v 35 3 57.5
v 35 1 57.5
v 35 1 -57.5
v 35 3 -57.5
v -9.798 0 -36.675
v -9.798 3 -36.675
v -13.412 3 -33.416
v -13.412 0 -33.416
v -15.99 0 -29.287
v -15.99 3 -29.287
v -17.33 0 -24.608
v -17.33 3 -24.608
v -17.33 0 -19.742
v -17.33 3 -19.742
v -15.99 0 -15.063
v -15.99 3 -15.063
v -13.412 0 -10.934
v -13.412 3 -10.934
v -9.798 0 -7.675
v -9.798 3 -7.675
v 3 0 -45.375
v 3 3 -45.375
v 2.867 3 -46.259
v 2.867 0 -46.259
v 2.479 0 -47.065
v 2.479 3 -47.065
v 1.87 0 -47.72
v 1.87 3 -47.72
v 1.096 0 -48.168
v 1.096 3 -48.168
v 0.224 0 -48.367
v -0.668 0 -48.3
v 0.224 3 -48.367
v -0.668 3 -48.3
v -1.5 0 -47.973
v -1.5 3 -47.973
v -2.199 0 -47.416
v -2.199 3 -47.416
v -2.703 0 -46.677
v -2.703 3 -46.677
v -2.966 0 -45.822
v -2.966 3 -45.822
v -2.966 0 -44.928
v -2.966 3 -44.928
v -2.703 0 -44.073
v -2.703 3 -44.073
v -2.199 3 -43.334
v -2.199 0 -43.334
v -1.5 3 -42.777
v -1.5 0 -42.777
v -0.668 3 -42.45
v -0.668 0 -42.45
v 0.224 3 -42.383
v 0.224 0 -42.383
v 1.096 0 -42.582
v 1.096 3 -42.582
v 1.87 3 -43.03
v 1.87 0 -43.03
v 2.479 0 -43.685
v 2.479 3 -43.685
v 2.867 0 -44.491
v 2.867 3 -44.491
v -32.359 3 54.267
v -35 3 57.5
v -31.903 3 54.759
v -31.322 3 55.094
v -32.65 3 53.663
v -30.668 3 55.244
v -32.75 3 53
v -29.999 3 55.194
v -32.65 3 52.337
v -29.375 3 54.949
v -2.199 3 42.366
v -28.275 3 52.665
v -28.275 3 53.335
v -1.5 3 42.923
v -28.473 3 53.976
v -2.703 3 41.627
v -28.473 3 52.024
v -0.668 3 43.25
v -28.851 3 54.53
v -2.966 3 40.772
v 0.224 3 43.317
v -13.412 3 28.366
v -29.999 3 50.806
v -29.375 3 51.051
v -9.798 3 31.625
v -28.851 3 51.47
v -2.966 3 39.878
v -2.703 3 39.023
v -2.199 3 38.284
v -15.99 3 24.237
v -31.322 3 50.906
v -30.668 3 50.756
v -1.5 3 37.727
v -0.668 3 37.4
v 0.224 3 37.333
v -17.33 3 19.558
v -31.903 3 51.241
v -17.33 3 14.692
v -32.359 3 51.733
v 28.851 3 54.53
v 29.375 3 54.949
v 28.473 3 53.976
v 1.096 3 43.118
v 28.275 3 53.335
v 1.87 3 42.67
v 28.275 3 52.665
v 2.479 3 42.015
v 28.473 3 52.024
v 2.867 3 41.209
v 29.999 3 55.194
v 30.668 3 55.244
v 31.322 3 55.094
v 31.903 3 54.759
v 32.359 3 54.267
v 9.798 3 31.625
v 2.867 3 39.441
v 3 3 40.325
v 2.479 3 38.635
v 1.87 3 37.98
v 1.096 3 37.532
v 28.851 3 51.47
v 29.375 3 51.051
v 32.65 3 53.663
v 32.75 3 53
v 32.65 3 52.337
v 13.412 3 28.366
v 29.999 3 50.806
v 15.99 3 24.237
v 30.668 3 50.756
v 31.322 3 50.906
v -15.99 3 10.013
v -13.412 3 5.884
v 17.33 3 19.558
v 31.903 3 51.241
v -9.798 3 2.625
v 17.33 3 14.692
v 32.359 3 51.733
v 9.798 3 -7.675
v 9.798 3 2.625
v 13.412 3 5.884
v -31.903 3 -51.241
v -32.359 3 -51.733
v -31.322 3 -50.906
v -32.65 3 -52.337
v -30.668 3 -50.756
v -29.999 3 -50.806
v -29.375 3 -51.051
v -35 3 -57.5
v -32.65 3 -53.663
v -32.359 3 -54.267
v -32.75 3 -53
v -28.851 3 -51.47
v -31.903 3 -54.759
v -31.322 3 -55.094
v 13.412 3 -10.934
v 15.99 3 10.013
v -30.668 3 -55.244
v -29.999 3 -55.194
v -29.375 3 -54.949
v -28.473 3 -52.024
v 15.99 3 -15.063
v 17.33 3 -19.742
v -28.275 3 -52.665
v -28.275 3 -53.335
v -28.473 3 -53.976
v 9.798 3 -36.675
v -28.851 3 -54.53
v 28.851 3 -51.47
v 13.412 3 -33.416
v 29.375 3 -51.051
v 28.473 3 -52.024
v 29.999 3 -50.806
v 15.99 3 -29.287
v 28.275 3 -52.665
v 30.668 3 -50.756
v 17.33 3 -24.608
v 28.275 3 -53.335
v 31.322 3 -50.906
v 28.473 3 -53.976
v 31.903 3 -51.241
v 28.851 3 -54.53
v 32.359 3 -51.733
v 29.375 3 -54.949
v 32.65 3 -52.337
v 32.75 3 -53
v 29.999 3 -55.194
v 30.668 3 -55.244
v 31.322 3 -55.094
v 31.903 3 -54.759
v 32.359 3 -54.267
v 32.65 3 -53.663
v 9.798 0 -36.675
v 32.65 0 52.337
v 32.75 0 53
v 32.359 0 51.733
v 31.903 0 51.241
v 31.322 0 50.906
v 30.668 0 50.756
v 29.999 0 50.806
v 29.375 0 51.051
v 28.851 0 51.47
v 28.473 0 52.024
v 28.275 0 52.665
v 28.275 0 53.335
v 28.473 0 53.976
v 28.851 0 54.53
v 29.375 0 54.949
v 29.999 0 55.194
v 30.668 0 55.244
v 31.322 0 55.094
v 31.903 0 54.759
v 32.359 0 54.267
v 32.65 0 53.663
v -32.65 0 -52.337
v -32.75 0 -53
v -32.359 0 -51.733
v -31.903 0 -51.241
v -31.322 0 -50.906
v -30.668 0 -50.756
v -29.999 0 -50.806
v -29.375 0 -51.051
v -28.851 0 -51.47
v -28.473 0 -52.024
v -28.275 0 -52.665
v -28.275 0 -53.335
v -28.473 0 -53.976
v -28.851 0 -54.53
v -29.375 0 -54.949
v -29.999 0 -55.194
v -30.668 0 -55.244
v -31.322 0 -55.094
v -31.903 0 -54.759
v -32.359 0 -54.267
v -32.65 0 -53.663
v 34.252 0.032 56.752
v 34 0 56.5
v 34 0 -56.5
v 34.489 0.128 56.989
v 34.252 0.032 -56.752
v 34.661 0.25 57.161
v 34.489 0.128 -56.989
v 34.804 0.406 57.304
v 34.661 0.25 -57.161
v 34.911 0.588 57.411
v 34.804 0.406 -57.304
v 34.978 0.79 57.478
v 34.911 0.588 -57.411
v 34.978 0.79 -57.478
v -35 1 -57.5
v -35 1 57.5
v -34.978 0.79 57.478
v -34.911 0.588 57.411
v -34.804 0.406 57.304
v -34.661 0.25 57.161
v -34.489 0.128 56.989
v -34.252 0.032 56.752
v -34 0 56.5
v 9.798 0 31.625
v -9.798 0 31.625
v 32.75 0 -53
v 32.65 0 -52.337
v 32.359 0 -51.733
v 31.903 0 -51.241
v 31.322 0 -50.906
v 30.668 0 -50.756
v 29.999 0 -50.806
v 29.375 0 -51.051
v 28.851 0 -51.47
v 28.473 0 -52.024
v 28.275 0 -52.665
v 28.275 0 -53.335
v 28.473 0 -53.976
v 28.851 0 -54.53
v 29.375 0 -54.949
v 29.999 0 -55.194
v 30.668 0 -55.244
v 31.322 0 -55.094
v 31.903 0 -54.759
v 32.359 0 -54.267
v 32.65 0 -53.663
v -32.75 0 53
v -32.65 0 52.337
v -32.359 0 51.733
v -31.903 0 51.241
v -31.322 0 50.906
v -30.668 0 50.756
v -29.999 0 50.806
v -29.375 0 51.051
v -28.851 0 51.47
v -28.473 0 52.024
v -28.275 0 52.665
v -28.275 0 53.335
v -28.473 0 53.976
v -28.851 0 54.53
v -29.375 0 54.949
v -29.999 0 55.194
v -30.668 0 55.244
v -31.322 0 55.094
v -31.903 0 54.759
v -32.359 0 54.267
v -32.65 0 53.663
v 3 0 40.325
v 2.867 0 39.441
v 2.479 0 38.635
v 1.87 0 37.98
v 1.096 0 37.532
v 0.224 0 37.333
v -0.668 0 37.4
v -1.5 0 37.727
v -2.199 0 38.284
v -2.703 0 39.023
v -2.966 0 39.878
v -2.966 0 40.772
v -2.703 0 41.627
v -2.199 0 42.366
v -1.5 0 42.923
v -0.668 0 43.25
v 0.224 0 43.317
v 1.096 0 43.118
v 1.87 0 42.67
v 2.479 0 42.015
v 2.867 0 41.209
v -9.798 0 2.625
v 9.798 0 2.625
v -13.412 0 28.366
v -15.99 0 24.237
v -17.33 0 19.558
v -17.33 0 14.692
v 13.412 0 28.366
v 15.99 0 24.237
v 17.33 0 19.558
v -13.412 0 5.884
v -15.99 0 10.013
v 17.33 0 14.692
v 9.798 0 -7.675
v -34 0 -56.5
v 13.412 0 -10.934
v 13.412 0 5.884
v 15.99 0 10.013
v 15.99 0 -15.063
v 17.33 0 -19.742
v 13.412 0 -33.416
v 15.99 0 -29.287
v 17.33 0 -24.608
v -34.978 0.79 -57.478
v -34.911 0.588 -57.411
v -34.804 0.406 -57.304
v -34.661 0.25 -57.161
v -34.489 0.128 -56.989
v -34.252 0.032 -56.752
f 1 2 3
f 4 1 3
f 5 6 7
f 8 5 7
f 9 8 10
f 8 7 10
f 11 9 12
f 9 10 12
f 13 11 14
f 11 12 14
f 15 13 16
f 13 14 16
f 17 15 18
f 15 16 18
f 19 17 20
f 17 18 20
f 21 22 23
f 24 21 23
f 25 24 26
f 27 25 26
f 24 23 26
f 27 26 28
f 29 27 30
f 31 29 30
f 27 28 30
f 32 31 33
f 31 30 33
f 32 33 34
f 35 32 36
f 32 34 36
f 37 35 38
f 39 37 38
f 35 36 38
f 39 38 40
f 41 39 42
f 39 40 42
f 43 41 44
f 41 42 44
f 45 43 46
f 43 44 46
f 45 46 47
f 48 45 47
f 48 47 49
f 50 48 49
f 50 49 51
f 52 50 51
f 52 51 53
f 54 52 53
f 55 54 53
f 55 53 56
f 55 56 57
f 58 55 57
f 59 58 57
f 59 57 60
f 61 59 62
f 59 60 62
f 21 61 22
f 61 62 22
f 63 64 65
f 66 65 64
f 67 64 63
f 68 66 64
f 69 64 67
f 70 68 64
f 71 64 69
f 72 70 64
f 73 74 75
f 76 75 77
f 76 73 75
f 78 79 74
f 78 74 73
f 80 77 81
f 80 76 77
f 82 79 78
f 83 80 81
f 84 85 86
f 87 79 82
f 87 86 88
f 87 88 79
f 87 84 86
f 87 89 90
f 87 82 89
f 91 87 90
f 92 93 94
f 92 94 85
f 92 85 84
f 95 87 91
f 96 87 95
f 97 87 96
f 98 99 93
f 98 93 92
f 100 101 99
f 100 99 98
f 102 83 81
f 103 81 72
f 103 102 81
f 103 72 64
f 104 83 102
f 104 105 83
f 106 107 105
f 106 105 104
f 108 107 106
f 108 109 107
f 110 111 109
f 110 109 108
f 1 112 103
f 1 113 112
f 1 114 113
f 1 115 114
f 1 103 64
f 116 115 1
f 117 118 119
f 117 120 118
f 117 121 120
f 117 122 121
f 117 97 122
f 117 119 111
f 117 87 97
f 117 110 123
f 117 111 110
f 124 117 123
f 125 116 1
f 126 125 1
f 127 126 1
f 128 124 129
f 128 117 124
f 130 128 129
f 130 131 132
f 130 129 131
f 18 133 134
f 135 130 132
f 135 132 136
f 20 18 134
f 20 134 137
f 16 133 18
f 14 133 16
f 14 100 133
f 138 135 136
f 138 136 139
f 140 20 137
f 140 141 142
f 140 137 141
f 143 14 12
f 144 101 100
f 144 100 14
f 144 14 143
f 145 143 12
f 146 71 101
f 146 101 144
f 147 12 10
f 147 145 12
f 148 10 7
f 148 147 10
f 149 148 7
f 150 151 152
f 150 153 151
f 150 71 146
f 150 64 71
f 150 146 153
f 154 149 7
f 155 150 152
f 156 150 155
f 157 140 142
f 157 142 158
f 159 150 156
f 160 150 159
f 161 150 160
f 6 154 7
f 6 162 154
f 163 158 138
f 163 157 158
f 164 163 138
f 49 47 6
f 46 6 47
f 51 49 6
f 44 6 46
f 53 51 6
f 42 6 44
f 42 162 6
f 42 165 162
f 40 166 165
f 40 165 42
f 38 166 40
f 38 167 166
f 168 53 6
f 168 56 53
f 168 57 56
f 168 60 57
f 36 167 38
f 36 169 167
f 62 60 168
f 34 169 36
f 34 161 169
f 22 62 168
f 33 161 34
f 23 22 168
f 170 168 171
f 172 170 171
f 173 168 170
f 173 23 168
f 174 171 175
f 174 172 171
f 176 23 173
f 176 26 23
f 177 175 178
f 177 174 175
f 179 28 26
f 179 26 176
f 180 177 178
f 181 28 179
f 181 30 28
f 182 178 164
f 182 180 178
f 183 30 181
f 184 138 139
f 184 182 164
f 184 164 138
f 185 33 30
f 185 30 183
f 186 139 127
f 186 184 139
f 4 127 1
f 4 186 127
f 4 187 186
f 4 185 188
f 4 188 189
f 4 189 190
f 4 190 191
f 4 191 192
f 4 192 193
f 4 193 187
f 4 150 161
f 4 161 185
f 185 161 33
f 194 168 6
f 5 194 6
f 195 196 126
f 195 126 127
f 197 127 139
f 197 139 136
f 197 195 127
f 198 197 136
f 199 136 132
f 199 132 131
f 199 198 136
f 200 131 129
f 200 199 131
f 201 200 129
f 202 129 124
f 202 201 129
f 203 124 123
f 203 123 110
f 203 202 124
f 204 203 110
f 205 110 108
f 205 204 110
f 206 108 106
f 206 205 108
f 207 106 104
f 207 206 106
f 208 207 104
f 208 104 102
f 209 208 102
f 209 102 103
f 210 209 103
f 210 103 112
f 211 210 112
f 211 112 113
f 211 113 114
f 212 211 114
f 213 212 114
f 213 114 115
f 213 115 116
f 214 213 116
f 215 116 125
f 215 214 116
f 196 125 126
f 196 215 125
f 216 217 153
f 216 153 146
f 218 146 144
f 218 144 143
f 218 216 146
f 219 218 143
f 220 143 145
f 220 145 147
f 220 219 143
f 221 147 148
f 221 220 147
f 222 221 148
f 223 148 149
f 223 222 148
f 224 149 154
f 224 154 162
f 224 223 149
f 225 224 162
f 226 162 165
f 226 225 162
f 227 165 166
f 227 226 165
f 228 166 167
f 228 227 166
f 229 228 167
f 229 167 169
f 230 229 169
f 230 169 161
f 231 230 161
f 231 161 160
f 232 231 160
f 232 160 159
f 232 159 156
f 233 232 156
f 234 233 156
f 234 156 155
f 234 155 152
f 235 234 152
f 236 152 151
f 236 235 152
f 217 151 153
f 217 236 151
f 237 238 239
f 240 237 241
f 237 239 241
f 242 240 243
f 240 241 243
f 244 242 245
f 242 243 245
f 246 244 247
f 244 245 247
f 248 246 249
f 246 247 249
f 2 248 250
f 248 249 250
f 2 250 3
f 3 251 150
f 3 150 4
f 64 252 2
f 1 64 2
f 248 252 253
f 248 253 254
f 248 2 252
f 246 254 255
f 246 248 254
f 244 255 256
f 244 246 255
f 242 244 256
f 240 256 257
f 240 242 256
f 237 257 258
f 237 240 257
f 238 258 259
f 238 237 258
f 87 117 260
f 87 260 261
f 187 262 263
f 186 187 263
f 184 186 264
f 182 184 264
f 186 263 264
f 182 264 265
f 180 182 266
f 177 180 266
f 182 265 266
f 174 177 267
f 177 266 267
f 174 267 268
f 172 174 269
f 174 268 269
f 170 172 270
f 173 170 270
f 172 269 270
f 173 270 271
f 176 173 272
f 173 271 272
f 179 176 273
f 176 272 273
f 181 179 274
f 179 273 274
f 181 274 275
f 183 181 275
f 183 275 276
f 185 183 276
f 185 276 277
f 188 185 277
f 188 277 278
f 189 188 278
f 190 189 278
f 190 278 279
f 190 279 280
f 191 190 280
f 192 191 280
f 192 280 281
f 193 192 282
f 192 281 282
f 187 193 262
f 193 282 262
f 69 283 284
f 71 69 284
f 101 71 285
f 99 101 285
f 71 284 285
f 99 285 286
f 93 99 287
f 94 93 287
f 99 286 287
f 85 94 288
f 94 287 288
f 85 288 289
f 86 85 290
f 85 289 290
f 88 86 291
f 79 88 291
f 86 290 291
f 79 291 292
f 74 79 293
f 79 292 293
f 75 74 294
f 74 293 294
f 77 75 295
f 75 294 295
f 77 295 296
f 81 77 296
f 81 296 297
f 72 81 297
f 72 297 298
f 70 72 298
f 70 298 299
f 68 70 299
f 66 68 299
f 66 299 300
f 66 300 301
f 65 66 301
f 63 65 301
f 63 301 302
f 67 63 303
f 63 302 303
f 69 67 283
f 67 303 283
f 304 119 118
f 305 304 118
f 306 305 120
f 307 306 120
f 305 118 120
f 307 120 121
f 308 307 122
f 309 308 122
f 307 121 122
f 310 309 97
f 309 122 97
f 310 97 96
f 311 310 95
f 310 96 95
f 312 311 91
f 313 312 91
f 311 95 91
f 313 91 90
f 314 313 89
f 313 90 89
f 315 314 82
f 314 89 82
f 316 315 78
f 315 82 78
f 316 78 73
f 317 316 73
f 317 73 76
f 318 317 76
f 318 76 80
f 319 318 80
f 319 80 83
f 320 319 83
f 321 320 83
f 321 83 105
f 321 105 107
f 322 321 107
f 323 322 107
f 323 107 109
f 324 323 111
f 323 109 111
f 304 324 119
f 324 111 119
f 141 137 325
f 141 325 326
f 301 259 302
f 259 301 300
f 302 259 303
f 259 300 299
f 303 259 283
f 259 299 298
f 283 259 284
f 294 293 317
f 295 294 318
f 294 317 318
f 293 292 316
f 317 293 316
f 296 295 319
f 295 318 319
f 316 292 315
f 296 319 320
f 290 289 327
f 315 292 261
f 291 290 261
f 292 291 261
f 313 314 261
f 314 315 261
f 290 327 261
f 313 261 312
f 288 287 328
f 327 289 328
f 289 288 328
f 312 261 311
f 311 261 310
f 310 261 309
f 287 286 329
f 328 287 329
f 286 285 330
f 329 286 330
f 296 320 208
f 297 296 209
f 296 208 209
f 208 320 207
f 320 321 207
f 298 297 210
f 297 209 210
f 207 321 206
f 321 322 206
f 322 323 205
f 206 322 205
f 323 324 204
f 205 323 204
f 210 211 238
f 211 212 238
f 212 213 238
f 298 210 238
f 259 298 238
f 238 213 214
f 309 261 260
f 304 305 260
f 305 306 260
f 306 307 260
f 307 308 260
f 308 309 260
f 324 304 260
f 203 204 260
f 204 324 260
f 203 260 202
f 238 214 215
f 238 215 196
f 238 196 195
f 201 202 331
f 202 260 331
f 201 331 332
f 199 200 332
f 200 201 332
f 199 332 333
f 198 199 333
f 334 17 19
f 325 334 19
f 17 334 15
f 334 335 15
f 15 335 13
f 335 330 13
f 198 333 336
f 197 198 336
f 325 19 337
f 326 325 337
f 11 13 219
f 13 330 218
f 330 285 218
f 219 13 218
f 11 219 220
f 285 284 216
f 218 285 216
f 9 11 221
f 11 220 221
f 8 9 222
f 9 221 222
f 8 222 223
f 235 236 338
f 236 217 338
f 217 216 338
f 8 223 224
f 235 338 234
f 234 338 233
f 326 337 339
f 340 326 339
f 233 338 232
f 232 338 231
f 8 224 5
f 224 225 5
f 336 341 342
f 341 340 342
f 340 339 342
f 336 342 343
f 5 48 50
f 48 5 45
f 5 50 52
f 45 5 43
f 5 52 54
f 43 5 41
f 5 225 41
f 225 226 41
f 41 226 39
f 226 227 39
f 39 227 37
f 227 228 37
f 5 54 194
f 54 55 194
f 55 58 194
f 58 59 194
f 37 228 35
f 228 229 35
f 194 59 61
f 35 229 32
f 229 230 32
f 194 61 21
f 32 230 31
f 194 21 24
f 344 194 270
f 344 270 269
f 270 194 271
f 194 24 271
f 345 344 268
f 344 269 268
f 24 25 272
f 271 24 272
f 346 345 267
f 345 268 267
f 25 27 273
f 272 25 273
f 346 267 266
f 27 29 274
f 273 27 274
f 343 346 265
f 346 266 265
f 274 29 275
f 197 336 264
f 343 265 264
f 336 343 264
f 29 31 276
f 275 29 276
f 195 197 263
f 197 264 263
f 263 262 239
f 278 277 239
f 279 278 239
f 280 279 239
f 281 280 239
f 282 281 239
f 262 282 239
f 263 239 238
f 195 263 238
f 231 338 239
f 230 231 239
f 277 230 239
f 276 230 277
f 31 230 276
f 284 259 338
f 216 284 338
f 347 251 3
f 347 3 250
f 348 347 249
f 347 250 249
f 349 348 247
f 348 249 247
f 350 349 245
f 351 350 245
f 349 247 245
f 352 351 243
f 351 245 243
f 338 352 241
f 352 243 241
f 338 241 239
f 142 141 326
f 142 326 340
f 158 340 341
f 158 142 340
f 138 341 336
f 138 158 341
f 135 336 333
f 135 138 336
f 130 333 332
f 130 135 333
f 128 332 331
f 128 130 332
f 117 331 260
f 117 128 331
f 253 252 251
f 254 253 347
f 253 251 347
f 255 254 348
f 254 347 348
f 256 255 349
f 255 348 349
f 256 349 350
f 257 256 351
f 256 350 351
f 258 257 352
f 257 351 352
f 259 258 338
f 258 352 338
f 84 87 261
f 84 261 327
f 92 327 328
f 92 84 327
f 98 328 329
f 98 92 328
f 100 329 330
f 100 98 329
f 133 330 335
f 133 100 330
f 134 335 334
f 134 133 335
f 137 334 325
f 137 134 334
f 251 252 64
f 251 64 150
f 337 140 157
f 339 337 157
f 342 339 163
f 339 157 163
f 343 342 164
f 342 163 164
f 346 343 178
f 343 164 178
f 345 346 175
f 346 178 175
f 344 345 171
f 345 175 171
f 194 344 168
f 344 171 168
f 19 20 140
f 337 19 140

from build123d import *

# Parameters (mm, degrees)
SKETCH1_W                                  = 70
SKETCH1_H                                  = 115
BOSS_EXTRUDE1_DEPTH                        = 3
SKETCH4_R                                  = 2.25
CUT_EXTRUDE2_DEPTH                         = 3
MIRROR1_AT_THE_SECOND_PLANE_COPY_1_SKETC_R = 2.25
MIRROR1_AT_THE_SECOND_PLANE_COPY_1_DEPTH   = 3
FILLET4_R                                  = 1
CUT_EXTRUDE13_START                        = -3
CUT_EXTRUDE13_DEPTH                        = 4
SKETCH21_R                                 = 3
CUT_EXTRUDE14_DEPTH                        = 3


with BuildPart() as part:
    # Sketch1 → Boss-Extrude1 (new body)
    with BuildSketch(Plane(origin=(0, 0, 0), x_dir=(1, 0, 0), z_dir=(0, 1, 0))):
        Rectangle(SKETCH1_W, SKETCH1_H)
    extrude(amount=BOSS_EXTRUDE1_DEPTH)

    # Sketch4 → Cut-Extrude2 (cut)
    with BuildSketch(Plane(origin=(0, 0, 0), x_dir=(-1, 0, 0), z_dir=(0, -1, 0))):
        with Locations((30.5, -53)):
            Circle(SKETCH4_R)
    cut_extrude2 = extrude(amount=-CUT_EXTRUDE2_DEPTH, mode=Mode.SUBTRACT)

    # Mirror1: Cut-Extrude2 across plane
    add(cut_extrude2.mirror(Plane(origin=(0, 0, 0), x_dir=(0, 0, 1), z_dir=(1, 0, 0))), mode=Mode.SUBTRACT)

    # Mirror1 at the second plane: Cut-Extrude2 across plane
    add(cut_extrude2.mirror(Plane.XY), mode=Mode.SUBTRACT)

    # Mirror1 at the second plane copy 1 sketc → Mirror1 at the second plane copy 1 (cut)
    with BuildSketch(Plane.XZ):
        with Locations((30.5, -53)):
            Circle(MIRROR1_AT_THE_SECOND_PLANE_COPY_1_SKETC_R)
    extrude(amount=-MIRROR1_AT_THE_SECOND_PLANE_COPY_1_DEPTH, mode=Mode.SUBTRACT)

    # Fillet4
    fillet4_edges = [part.edges().sort_by_distance(p)[0] for p in [
        (0, 0, 57.5),
        (-35, 0, 0),
        (0, 0, -57.5),
        (35, 0, 0),
    ]]
    fillet(fillet4_edges, radius=FILLET4_R)

    # Sketch18 → Cut-Extrude13 (cut)
    with BuildSketch(Plane(origin=(0, 0, 0), x_dir=(-1, 0, 0), z_dir=(0, -1, 0)).offset(CUT_EXTRUDE13_START)):
        with BuildLine():
            Line((-9.797958971, -31.625), (9.797958971, -31.625))
            ThreePointArc((9.797958971, -31.625), (17.5, -17.125), (9.797958971, -2.625))
            Line((9.797958971, -2.625), (-9.797958971, -2.625))
            ThreePointArc((-9.797958971, -2.625), (-17.5, -17.125), (-9.797958971, -31.625))
        make_face()
    cut_extrude13 = extrude(amount=CUT_EXTRUDE13_DEPTH, mode=Mode.SUBTRACT)

    # Mirror3: Cut-Extrude13 across plane
    add(cut_extrude13.mirror(Plane.XY.offset(-2.525)), mode=Mode.SUBTRACT)

    # Sketch21 → Cut-Extrude14 (cut)
    with BuildSketch(Plane(origin=(0, 3, 0), x_dir=(1, 0, 0), z_dir=(0, 1, 0))):
        with Locations((0, 45.375)):
            Circle(SKETCH21_R)
        with Locations((0, -40.325)):
            Circle(SKETCH21_R)
    extrude(amount=-CUT_EXTRUDE14_DEPTH, mode=Mode.SUBTRACT)


solid = part.part
